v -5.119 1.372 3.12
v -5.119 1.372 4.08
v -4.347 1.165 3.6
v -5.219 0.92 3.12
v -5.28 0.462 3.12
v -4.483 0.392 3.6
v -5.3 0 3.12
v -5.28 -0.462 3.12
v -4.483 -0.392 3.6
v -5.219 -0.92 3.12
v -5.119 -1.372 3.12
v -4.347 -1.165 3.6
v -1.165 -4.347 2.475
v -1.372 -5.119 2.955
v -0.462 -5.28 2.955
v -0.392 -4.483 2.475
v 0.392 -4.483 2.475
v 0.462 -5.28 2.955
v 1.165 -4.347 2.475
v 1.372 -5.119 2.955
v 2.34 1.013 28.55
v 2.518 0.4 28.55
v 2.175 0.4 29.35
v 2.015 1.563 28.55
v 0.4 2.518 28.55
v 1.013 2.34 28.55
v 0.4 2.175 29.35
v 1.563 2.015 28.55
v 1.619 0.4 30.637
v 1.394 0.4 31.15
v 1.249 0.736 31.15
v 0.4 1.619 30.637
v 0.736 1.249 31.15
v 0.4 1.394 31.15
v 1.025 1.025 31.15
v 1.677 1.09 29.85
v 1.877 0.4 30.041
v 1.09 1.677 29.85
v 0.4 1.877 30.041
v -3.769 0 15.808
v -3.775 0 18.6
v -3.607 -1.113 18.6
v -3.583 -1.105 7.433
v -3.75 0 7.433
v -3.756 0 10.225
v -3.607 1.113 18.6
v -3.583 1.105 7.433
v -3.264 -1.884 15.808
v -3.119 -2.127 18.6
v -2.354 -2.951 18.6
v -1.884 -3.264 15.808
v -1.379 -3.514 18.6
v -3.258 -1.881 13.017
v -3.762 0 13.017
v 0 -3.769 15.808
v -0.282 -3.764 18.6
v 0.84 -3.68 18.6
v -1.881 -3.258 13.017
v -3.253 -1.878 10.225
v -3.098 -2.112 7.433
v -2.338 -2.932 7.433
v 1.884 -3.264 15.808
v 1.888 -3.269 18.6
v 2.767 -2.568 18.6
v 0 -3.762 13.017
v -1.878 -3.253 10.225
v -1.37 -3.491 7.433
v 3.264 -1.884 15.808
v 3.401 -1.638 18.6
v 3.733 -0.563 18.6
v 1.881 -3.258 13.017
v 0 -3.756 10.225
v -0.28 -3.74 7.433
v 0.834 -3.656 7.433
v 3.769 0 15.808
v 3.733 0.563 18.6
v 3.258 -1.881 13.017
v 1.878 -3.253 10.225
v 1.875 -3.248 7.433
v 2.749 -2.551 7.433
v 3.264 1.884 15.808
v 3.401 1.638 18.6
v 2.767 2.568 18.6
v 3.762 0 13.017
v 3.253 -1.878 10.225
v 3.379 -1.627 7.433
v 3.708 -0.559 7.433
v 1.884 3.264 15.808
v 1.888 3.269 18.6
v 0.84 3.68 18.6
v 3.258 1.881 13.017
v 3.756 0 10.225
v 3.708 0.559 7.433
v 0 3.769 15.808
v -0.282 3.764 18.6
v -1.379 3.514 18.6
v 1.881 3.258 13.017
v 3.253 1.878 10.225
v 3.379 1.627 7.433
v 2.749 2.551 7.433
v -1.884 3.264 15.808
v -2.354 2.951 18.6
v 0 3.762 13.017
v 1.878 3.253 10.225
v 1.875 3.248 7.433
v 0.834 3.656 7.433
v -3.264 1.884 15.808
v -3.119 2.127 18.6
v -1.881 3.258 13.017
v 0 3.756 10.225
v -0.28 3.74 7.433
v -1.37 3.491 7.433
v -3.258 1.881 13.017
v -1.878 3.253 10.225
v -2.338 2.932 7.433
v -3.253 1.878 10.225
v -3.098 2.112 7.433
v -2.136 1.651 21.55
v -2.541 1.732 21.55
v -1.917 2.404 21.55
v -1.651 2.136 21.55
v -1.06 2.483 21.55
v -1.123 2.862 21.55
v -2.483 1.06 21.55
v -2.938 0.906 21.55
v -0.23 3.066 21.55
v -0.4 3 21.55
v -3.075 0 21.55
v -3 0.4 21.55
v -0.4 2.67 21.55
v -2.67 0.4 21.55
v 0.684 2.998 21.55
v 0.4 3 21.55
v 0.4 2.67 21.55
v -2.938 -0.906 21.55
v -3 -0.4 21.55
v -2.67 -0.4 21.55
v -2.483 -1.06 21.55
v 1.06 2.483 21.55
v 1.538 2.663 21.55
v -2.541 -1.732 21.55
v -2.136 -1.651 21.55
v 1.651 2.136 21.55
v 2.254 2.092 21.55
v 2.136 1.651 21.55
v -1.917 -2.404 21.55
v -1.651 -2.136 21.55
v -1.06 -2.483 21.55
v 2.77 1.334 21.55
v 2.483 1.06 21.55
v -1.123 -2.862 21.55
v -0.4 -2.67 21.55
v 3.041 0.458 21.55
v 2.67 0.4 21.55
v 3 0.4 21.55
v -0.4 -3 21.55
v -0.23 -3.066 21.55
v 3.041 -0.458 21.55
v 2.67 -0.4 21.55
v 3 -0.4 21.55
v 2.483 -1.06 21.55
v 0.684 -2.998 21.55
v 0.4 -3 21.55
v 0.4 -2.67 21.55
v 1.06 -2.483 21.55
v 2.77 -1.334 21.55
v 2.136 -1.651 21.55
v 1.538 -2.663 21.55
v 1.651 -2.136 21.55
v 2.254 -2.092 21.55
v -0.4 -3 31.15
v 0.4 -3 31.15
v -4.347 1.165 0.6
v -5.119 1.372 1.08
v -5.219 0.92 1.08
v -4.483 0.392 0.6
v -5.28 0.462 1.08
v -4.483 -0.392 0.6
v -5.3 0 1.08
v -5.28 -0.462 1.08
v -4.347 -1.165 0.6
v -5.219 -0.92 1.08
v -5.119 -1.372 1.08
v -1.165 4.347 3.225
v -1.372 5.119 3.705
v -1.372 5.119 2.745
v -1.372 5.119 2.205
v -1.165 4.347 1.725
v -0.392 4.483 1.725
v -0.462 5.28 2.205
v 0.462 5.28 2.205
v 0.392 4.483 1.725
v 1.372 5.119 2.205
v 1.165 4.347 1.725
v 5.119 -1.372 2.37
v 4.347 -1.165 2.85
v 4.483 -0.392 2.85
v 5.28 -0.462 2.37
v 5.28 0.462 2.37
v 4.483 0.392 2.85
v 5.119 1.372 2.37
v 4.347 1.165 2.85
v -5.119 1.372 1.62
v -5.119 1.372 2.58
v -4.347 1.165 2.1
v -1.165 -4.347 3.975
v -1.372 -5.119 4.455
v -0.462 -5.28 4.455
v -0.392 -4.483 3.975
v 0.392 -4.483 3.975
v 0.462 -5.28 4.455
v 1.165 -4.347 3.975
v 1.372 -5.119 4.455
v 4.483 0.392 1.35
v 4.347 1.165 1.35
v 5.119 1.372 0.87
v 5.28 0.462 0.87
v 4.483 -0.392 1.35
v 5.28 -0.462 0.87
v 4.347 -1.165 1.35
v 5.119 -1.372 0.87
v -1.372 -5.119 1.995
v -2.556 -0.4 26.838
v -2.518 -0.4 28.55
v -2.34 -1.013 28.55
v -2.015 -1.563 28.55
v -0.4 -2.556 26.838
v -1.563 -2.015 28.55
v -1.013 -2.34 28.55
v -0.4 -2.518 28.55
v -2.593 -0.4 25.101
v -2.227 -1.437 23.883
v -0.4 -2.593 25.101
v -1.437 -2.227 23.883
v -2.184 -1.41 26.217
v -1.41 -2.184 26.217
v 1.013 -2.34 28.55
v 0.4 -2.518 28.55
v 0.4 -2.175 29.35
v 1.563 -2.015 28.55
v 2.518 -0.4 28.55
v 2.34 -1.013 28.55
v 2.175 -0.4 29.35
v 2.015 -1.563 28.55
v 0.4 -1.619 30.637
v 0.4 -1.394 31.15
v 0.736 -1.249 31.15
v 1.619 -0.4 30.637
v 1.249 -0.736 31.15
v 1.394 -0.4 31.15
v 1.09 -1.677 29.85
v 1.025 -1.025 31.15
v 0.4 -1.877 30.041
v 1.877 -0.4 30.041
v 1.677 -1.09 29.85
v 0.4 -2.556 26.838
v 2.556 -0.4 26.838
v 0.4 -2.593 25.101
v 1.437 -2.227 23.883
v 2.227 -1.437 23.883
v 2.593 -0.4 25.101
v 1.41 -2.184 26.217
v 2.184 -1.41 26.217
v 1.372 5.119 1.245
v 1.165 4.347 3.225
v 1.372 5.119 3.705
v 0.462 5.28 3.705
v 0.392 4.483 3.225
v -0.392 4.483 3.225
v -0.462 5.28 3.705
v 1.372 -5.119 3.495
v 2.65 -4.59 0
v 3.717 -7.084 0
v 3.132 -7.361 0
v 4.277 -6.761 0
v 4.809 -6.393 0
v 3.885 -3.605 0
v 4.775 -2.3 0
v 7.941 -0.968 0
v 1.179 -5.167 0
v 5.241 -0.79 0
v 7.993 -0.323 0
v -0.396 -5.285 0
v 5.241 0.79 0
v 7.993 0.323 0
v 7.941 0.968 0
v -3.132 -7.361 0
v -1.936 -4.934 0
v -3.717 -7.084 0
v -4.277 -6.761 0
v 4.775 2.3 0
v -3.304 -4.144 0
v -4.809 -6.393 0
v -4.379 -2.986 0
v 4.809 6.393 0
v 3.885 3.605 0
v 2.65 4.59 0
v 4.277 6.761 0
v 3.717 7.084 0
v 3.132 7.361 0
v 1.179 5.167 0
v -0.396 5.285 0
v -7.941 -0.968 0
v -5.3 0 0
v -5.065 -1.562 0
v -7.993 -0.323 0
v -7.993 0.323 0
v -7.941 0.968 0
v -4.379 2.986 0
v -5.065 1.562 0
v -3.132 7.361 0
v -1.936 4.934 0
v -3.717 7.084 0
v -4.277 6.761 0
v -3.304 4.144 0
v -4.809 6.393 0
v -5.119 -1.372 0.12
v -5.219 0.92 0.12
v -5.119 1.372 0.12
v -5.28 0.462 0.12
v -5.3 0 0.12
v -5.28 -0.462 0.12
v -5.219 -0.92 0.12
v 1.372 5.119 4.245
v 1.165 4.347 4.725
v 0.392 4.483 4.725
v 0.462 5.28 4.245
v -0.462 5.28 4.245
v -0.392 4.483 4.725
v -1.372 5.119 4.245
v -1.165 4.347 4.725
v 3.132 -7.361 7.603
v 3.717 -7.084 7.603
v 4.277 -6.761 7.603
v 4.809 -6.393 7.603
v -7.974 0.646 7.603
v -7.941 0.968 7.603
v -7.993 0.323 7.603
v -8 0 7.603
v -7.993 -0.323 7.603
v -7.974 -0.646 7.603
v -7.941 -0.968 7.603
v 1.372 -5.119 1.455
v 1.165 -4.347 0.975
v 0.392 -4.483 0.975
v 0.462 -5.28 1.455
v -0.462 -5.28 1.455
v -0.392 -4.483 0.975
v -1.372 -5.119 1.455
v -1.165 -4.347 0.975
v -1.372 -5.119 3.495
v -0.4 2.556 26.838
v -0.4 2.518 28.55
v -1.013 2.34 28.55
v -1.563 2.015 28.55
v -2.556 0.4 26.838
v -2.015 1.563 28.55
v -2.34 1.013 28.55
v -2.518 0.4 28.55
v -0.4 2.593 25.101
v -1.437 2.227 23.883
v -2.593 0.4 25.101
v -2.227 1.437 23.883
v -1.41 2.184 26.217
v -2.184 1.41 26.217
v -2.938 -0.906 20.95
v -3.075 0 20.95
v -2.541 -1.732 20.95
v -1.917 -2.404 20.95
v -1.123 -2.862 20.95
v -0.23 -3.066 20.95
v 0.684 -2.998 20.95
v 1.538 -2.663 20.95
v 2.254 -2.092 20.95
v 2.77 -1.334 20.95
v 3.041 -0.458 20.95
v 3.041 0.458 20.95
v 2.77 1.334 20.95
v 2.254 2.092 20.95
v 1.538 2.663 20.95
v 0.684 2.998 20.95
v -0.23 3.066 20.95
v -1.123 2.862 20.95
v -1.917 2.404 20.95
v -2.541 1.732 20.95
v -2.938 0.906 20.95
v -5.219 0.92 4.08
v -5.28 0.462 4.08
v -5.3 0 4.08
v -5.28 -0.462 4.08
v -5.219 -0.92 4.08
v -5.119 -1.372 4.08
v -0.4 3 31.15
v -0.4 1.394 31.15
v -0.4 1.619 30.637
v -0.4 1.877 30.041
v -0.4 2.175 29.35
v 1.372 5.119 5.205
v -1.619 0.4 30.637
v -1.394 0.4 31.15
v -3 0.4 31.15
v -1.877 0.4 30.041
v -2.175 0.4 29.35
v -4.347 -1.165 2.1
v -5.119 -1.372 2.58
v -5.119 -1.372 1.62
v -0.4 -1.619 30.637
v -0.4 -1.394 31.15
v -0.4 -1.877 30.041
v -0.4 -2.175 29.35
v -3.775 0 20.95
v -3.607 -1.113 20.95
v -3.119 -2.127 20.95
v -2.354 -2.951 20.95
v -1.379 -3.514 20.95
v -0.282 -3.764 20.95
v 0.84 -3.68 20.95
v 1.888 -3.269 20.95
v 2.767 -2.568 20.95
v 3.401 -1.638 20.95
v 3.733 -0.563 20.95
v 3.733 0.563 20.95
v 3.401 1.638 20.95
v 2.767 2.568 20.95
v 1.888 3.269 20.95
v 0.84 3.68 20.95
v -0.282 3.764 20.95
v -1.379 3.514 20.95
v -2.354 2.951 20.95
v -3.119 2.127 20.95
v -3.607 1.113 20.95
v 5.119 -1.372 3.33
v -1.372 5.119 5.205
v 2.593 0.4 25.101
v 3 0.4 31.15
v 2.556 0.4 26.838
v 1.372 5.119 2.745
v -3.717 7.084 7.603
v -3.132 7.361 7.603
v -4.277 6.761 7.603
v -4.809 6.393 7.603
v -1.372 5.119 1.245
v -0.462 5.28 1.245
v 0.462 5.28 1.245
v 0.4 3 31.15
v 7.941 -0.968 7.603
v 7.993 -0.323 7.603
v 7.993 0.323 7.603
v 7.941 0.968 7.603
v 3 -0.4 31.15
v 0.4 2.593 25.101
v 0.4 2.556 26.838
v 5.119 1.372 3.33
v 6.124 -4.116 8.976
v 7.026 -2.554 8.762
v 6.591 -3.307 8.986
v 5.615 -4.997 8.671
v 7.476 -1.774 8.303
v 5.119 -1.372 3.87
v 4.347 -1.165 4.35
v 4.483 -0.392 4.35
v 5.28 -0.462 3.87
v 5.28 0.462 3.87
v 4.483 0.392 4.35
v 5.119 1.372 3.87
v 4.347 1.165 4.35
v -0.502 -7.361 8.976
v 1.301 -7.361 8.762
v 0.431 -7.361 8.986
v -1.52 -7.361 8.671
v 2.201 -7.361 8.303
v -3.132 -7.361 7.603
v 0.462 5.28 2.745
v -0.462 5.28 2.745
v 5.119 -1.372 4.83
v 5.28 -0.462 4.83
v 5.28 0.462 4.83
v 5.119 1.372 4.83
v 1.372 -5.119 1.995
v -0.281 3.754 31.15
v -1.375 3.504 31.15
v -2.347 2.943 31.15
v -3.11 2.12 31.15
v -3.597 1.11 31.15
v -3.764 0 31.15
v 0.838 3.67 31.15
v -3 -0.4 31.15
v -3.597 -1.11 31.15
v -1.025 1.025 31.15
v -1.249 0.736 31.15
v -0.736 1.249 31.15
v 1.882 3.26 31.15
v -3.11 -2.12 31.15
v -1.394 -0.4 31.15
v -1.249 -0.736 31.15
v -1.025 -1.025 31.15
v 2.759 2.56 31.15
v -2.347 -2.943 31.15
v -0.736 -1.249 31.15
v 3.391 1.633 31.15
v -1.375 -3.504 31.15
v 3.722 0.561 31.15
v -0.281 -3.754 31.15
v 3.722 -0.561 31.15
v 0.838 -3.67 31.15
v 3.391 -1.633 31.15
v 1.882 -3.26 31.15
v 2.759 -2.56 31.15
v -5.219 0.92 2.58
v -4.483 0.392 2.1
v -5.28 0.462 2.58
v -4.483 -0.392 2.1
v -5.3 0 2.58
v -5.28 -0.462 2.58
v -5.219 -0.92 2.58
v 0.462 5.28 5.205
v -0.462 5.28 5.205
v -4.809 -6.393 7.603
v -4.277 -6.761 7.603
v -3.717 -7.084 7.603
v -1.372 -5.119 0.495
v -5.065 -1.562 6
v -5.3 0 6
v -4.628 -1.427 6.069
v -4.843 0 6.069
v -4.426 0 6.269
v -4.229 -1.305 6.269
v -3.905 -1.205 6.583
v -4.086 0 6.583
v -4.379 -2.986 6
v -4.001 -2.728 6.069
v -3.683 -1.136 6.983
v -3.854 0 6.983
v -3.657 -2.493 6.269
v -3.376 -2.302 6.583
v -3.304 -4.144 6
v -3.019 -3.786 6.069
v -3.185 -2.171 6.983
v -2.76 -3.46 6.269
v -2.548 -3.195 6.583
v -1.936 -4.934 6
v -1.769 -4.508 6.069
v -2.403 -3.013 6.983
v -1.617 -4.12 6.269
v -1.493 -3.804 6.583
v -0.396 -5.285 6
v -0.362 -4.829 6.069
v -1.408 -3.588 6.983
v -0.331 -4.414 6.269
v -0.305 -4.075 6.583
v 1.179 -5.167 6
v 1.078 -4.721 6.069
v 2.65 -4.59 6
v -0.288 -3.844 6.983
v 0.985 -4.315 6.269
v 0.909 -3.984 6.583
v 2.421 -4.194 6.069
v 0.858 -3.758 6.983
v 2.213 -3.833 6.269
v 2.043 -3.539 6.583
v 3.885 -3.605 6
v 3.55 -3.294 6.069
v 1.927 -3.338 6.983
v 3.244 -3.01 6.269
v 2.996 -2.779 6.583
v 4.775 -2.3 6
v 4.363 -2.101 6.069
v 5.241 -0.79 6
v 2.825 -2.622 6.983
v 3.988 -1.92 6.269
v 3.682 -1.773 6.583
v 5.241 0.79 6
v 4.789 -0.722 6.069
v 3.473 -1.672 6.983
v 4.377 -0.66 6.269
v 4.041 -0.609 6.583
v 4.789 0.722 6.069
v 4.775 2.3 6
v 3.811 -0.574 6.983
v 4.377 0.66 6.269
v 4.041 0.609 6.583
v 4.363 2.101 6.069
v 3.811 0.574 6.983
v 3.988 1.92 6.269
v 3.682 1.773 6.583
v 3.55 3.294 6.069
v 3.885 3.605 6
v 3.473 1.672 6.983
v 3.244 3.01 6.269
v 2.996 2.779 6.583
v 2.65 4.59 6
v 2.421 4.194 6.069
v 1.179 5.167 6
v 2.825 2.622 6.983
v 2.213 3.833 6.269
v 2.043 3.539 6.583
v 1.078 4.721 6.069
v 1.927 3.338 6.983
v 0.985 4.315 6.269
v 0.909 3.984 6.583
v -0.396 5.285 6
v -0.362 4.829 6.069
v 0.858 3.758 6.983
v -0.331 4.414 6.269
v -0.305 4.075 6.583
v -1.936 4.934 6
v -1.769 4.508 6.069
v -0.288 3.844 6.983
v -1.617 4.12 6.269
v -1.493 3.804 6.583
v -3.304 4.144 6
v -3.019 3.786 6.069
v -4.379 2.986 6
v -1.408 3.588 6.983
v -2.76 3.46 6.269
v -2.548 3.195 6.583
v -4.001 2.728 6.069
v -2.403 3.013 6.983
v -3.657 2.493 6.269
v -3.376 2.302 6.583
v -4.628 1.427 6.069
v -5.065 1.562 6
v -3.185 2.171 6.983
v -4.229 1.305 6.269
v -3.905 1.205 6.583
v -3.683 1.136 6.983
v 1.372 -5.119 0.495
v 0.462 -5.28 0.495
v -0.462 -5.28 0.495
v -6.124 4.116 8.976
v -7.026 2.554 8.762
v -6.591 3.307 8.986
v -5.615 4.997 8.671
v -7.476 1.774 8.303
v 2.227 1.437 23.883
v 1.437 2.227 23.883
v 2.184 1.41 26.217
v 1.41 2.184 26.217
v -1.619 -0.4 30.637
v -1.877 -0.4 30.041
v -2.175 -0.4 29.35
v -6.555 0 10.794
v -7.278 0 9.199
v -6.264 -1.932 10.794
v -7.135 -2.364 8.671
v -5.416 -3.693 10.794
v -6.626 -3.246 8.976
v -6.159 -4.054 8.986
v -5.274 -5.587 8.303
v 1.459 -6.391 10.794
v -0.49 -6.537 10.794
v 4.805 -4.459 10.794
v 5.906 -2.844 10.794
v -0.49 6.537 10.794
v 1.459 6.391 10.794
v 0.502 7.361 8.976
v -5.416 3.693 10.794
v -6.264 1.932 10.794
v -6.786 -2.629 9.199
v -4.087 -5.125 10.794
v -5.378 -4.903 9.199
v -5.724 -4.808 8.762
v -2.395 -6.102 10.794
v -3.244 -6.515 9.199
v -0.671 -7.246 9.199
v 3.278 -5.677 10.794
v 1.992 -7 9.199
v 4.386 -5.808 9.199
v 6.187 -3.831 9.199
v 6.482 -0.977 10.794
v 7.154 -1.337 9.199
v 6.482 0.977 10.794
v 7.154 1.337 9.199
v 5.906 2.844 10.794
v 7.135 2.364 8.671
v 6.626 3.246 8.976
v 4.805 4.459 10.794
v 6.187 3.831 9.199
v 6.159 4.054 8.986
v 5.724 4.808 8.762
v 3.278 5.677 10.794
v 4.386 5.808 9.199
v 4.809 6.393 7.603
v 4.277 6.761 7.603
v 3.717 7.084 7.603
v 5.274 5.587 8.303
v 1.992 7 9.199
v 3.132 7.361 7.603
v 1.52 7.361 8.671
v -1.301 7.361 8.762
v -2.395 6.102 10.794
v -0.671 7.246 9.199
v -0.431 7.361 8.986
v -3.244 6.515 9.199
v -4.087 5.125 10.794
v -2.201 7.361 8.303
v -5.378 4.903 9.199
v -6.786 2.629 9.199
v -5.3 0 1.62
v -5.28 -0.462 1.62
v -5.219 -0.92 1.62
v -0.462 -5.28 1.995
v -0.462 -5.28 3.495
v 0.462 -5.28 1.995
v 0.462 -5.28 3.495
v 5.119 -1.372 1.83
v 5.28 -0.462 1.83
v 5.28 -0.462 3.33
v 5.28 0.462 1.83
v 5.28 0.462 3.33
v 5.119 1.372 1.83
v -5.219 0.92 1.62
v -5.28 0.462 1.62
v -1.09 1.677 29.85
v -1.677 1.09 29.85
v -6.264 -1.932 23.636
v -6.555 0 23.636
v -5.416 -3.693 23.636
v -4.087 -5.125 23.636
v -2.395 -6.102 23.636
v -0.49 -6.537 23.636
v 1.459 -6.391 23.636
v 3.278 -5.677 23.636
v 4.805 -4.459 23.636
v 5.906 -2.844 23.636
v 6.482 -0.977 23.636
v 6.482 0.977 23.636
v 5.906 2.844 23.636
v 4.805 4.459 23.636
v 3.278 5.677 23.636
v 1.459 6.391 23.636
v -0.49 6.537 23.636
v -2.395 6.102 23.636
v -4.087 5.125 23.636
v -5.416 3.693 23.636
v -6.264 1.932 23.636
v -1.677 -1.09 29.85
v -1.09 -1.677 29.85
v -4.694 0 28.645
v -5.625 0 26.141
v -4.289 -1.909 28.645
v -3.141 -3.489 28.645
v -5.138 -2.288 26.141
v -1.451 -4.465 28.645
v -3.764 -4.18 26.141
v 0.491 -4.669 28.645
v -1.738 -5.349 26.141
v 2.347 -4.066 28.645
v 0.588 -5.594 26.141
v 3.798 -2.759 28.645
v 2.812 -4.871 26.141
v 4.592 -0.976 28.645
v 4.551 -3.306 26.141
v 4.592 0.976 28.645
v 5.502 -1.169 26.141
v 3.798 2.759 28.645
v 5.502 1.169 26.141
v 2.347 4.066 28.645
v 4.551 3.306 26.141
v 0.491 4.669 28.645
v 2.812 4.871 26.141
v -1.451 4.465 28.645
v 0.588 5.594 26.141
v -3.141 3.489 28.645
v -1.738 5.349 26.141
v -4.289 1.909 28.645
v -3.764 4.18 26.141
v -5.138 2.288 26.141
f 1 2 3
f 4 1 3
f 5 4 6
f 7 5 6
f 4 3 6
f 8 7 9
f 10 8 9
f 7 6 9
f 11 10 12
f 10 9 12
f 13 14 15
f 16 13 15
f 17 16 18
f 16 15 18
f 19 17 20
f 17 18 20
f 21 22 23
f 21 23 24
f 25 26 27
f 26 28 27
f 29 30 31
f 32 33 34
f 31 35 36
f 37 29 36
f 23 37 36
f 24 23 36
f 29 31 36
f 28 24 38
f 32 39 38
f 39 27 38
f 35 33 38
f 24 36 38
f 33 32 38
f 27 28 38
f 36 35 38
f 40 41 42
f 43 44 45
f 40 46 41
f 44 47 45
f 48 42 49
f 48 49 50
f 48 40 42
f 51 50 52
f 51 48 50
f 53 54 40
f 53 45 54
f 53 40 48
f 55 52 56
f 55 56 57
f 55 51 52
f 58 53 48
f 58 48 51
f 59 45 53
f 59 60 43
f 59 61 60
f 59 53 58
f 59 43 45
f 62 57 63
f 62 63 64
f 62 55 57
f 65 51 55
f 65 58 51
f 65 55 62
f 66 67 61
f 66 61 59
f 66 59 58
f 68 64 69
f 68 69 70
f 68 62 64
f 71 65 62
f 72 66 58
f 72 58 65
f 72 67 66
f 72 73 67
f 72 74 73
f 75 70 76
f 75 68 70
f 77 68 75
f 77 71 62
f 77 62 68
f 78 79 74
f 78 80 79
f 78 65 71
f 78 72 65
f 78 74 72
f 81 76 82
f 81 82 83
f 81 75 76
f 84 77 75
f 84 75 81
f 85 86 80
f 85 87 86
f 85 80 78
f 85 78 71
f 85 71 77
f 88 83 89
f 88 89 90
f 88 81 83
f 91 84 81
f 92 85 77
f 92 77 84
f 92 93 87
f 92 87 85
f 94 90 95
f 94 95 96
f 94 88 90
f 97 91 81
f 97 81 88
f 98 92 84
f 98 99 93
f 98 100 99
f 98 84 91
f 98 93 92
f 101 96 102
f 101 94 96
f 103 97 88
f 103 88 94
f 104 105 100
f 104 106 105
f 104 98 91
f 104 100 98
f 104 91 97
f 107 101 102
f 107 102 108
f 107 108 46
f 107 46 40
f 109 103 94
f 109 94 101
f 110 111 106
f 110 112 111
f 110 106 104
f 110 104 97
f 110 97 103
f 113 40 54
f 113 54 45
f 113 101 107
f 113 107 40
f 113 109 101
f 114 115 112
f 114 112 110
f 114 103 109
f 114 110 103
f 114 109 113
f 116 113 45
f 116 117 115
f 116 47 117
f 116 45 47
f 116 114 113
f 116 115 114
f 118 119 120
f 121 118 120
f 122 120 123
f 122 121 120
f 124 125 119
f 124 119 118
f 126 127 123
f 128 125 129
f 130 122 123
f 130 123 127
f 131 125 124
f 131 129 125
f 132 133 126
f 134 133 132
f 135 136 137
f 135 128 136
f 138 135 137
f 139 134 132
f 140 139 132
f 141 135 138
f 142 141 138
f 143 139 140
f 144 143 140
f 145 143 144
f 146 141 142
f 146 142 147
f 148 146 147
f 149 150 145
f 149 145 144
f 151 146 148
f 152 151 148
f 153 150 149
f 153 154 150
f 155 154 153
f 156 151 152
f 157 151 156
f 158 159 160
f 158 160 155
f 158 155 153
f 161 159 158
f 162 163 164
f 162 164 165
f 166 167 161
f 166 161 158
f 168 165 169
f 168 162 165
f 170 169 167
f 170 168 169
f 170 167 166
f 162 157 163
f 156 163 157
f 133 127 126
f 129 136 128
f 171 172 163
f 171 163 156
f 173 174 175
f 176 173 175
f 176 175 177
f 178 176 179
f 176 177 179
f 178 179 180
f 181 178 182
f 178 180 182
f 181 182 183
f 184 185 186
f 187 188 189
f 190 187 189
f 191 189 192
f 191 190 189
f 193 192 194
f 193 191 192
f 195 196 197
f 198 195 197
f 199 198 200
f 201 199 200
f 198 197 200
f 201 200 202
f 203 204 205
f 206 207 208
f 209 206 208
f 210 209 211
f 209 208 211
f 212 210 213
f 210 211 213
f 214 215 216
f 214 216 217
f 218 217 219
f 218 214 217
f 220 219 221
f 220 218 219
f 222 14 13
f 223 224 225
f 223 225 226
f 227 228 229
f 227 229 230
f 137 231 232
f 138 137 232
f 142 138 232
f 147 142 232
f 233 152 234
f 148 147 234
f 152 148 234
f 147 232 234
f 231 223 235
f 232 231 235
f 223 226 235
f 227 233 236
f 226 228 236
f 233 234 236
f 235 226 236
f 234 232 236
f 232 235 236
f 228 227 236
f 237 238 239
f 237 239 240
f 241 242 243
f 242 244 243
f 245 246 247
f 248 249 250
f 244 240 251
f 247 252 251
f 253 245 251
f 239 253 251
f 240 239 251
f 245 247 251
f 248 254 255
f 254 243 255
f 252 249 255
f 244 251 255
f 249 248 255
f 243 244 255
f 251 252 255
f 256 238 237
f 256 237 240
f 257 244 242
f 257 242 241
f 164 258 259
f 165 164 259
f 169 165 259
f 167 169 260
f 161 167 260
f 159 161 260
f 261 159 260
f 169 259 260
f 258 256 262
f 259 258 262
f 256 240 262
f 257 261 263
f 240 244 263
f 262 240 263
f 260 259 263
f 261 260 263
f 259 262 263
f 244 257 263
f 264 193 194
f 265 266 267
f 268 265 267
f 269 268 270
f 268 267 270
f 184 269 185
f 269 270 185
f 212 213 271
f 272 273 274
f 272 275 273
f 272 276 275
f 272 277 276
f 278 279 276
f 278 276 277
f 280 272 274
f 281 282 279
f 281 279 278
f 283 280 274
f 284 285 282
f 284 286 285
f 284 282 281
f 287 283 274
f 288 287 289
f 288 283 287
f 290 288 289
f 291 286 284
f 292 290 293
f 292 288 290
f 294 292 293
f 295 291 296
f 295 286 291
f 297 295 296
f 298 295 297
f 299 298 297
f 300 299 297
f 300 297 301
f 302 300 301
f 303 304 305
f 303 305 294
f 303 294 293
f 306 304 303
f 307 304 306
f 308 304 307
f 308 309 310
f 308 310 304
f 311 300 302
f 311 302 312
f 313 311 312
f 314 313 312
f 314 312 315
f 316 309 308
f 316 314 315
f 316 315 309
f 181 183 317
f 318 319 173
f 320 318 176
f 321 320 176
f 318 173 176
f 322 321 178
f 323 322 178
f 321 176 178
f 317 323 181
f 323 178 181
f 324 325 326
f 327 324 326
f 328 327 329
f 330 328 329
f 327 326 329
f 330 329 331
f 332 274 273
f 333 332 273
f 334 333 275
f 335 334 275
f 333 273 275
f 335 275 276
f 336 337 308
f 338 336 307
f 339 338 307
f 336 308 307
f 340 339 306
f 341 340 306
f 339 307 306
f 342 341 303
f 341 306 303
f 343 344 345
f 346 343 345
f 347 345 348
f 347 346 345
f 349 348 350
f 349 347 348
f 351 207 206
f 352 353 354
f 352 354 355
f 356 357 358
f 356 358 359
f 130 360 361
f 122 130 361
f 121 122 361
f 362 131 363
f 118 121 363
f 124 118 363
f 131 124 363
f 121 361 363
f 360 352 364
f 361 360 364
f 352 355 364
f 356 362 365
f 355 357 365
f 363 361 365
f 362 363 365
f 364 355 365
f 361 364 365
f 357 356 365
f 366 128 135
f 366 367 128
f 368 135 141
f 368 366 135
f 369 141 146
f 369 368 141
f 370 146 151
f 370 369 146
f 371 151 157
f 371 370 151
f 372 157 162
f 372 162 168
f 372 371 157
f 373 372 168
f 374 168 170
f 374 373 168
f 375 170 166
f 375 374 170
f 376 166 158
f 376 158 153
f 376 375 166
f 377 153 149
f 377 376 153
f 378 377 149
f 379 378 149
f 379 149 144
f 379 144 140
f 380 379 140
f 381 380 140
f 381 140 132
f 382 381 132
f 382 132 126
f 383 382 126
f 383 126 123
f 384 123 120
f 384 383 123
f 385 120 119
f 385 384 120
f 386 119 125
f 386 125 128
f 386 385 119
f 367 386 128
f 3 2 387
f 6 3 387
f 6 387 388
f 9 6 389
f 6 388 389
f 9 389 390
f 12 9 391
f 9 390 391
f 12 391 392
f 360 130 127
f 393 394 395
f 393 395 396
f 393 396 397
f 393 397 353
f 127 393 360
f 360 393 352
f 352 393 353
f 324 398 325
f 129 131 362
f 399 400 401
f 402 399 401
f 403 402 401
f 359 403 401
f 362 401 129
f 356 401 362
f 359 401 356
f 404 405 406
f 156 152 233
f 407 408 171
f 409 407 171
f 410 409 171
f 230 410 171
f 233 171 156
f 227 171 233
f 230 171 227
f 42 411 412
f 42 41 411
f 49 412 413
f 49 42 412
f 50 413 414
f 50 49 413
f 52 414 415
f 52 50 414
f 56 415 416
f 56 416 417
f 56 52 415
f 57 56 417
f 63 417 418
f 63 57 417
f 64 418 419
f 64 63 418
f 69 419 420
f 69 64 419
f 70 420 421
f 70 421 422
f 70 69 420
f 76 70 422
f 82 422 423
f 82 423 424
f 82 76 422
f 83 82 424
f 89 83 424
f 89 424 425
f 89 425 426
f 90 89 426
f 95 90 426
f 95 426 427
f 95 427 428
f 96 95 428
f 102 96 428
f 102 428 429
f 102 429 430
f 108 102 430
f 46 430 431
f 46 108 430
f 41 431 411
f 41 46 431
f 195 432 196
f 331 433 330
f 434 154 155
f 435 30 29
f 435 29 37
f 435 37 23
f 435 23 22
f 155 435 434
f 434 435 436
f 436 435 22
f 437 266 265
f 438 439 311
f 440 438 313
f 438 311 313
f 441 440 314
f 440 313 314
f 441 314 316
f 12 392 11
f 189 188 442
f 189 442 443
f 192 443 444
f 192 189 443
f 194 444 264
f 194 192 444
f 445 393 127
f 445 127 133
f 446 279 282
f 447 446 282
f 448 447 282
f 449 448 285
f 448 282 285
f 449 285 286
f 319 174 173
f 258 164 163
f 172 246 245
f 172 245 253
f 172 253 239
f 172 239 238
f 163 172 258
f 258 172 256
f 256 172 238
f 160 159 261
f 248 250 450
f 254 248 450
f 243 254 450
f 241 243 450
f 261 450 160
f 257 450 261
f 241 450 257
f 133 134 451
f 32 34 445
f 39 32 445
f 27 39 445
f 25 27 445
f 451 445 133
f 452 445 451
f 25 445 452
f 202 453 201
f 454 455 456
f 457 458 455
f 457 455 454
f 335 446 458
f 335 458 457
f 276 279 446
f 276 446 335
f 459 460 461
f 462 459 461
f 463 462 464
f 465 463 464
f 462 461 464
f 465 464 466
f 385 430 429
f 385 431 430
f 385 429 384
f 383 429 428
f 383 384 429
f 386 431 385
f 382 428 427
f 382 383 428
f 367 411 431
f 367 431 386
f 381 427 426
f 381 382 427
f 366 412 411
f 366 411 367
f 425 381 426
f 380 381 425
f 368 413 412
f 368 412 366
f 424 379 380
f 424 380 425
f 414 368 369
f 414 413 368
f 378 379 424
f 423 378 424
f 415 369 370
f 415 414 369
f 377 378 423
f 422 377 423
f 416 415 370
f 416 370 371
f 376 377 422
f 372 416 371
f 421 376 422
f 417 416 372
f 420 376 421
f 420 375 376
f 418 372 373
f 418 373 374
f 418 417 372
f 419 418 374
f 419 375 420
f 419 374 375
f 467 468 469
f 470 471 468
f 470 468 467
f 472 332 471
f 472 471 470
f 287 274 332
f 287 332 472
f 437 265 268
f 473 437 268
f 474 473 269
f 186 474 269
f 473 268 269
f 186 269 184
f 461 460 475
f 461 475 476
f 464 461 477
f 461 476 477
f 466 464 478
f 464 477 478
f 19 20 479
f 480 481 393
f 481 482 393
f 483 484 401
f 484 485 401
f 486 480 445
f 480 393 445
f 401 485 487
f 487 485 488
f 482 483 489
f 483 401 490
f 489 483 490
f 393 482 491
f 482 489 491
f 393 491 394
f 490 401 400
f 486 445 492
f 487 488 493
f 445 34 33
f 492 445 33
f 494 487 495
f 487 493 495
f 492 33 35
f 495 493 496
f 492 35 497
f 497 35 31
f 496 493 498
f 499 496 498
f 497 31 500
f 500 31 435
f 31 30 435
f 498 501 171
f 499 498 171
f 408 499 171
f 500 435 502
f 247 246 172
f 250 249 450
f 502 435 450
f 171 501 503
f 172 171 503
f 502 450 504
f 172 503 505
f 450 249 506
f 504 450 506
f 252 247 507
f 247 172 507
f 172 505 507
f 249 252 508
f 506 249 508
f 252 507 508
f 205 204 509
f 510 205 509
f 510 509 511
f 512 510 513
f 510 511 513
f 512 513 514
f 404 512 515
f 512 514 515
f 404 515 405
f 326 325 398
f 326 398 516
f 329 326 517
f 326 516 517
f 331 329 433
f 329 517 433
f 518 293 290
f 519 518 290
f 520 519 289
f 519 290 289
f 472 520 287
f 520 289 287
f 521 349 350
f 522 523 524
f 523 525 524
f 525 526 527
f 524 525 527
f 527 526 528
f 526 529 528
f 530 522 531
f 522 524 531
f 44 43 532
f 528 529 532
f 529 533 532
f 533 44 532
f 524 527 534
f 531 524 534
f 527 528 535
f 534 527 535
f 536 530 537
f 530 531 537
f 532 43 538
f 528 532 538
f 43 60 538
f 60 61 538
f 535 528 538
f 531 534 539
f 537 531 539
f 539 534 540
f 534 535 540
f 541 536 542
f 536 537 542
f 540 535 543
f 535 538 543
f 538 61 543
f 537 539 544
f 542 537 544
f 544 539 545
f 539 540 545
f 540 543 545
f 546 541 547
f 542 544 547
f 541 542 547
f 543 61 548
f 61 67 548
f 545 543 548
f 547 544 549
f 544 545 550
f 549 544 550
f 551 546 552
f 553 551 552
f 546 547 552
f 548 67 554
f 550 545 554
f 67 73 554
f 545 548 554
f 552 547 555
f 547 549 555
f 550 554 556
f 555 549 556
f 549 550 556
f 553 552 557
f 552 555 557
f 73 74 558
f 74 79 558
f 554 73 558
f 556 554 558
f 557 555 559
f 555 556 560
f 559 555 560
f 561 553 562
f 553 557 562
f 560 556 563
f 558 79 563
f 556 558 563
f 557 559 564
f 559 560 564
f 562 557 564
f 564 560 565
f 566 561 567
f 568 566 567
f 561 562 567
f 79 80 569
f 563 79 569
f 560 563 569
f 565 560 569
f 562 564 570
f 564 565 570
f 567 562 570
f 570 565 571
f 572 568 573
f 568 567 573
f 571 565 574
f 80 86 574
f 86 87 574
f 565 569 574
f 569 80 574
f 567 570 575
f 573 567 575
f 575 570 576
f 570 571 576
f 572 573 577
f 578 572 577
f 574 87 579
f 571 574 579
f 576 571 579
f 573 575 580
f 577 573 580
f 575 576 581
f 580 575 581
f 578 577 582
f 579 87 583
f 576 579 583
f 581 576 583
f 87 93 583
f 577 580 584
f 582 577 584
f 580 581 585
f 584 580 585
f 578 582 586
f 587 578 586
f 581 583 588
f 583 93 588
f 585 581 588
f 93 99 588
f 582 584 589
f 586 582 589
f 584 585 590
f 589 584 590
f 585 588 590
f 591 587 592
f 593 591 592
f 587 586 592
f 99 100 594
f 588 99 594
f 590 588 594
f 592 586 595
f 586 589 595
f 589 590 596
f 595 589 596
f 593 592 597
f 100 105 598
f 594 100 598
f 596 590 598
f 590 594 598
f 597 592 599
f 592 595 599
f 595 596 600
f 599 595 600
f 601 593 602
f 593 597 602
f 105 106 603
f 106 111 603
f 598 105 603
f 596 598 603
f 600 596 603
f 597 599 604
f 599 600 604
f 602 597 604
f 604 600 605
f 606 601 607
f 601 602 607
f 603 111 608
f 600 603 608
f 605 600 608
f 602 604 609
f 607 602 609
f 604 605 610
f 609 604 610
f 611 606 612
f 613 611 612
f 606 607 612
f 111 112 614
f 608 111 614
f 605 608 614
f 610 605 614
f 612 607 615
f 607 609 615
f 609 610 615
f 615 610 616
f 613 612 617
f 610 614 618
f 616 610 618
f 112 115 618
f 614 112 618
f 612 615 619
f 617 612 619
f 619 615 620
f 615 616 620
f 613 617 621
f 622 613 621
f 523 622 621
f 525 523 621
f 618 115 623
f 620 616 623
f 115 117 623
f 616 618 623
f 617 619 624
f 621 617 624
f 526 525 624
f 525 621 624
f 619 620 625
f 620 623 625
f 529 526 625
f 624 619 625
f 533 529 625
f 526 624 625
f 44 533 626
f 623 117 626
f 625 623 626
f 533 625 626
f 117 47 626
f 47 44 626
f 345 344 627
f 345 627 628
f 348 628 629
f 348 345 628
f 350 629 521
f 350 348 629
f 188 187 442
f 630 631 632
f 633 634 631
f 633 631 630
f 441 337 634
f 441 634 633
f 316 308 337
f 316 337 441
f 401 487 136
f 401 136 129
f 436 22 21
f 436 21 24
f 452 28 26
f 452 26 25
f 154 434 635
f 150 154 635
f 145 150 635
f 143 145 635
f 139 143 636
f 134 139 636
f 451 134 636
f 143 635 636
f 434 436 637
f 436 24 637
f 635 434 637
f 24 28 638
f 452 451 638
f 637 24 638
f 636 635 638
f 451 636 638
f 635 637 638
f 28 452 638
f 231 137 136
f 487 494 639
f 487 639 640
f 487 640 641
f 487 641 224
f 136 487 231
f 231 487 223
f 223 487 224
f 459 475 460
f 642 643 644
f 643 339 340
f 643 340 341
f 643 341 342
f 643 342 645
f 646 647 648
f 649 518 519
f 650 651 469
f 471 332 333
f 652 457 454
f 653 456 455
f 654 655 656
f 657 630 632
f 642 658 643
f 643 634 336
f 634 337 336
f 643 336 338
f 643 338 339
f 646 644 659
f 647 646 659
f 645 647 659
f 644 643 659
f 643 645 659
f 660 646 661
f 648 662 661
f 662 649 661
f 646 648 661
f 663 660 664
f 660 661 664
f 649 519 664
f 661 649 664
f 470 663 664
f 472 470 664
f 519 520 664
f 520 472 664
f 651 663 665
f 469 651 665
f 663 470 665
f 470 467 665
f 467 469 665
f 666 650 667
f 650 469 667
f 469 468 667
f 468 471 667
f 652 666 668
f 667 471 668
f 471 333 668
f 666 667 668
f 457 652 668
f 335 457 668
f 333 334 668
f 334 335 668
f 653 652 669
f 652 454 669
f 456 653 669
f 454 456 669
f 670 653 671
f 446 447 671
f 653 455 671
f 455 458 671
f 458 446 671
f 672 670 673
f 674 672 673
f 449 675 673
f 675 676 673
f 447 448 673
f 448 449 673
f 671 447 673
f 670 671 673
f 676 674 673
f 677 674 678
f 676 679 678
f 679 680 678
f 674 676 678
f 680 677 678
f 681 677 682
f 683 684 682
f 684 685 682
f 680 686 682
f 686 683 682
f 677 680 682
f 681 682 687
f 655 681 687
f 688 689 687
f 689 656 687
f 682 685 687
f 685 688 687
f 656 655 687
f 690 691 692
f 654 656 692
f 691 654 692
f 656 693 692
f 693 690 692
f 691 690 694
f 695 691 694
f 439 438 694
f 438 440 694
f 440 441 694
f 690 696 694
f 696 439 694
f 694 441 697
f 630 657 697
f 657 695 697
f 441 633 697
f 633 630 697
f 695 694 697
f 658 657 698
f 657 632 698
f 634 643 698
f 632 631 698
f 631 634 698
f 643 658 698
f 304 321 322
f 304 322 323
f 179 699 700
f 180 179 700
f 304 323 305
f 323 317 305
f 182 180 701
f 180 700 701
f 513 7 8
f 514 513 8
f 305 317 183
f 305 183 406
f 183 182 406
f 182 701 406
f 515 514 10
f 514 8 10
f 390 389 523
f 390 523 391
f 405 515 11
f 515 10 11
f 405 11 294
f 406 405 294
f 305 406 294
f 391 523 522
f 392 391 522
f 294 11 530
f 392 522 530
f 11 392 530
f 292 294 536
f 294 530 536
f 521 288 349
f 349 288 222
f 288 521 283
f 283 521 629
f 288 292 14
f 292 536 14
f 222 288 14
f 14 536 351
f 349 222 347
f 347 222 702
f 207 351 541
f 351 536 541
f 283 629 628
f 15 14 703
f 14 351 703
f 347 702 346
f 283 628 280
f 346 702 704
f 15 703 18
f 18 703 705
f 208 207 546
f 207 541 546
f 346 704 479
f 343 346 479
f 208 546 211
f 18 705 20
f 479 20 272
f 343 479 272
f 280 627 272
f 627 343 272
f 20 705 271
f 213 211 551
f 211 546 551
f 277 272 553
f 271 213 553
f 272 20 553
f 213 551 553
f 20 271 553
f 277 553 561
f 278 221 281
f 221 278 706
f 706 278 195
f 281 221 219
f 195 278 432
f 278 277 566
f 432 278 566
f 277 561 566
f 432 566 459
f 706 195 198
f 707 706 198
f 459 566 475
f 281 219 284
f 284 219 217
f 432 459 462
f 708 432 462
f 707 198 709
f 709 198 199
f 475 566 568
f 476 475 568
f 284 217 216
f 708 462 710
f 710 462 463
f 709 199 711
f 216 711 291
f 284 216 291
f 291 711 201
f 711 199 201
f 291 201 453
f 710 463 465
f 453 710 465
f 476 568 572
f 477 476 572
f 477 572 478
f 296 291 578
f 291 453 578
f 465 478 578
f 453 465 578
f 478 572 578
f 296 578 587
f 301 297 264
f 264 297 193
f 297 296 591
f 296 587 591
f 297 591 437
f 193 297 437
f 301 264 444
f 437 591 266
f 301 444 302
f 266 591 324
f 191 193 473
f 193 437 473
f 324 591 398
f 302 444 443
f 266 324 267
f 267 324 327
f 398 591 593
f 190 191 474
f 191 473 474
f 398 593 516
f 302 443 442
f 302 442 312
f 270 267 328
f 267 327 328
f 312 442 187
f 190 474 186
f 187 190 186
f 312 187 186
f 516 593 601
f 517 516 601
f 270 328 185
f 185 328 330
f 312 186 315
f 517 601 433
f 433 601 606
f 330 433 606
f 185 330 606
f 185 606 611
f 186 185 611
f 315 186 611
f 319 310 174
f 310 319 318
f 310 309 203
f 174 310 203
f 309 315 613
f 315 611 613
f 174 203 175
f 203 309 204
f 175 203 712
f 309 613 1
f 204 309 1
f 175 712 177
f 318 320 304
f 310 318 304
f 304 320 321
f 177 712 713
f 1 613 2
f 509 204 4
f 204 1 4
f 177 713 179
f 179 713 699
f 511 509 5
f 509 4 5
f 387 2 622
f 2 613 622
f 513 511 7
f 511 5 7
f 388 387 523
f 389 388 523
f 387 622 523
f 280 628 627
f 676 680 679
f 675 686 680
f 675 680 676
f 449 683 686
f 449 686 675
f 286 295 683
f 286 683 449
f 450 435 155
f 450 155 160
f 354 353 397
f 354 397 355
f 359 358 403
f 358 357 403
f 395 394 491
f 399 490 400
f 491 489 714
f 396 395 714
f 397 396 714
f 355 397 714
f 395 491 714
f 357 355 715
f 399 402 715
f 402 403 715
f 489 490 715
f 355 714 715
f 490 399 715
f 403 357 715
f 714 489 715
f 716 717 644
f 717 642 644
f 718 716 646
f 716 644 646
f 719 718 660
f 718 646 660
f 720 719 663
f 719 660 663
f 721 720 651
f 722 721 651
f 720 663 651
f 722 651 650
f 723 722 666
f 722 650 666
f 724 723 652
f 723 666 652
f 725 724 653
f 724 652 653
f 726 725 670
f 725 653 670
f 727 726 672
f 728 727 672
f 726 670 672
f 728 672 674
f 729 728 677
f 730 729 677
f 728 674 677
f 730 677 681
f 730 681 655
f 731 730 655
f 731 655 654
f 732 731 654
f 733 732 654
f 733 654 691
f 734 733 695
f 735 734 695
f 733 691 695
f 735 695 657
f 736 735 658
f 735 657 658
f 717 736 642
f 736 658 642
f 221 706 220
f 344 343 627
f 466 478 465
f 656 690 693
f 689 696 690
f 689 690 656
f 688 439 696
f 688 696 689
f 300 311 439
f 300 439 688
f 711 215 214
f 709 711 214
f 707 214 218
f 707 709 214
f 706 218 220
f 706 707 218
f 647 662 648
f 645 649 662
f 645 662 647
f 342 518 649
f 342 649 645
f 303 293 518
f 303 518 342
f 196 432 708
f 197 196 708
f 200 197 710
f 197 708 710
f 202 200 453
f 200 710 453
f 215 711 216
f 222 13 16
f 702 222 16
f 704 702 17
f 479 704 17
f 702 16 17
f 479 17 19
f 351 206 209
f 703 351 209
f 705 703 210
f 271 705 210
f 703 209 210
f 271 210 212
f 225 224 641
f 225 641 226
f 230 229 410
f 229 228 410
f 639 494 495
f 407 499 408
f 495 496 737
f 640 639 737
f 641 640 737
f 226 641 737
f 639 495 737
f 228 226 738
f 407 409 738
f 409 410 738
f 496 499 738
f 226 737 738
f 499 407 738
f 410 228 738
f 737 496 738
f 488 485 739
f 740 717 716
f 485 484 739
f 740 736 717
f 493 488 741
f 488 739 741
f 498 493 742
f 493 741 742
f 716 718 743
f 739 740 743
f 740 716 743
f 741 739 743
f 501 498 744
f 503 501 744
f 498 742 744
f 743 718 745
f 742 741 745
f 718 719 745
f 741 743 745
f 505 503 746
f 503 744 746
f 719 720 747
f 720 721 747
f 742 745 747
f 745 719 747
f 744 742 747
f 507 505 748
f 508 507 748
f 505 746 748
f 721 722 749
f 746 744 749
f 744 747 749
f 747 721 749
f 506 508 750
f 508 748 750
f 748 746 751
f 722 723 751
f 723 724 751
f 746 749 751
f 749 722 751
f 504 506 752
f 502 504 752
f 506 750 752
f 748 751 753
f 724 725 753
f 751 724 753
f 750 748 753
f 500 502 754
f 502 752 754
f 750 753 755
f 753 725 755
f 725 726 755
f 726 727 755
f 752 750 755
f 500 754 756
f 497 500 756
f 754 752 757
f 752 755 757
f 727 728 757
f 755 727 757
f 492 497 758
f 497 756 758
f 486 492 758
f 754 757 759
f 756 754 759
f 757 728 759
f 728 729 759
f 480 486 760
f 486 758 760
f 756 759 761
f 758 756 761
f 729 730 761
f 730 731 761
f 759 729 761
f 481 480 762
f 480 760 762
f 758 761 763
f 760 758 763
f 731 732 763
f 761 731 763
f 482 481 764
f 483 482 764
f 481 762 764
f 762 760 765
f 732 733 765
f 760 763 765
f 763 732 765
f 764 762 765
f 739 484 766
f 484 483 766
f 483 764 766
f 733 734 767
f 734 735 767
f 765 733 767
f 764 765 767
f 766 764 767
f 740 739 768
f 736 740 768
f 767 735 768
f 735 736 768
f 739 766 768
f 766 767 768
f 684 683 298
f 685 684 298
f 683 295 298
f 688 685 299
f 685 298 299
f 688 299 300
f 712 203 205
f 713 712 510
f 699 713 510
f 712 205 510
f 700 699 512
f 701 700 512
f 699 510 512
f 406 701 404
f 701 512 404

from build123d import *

# Parameters (mm, degrees)
SKETCH001_R         = 14.291544
POCKET_DEPTH        = 31.151
REVOLUTION001_ANGLE = 30
REVOLUTION002_ANGLE = 30
REVOLUTION003_ANGLE = 30
REVOLUTION004_ANGLE = 30
SKETCH006_W         = 0.8
SKETCH006_H         = 2.14163
POCKET001_DEPTH     = 107.126588
POLARPATTERN_COUNT  = 4


with BuildPart() as part:
    # Sketch → Revolution (revolve)
    with BuildSketch(Plane.XZ):
        with BuildLine():
            Line((-5.3, 0), (-5.3, 6))
            ThreePointArc((-5.3, 6), (-4.244457, 6.413224), (-3.75, 7.433241))
            Line((-3.775, 18.6), (-3.75, 7.433241))
            Line((-3.775, 20.95), (-3.775, 18.6))
            Line((-3.075, 20.95), (-3.775, 20.95))
            Line((-3.075, 21.55), (-3.075, 20.95))
            Line((-2.7, 21.55), (-3.075, 21.55))
            Line((-2.7, 21.55), (-2.55, 28.55))
            Line((-2.55, 28.55), (-1.45, 31.15))
            Line((-1.45, 31.15), (-3.764164, 31.15))
            Line((-3.764164, 31.15), (-6.55502, 23.635956))
            Line((-6.55502, 23.635956), (-6.55502, 10.794422))
            Line((-6.55502, 10.794422), (-8, 7.60349))
            Line((-8, 7.60349), (-8, 0))
            Line((-5.3, 0), (-8, 0))
        make_face()
    revolve(axis=Axis((0, 0, 0), (0, 0, 1)))

    # Sketch001 (on Face8 of Revolution) → Pocket (cut, through all)
    with BuildSketch(Plane(origin=(0, 0, 0), x_dir=(1, 0, 0), z_dir=(0, 0, -1))):
        Circle(SKETCH001_R)
        Polygon((8.5, 0), (4.25, 7.361216), (-4.25, 7.361216), (-8.5, 0), (-4.25, -7.361216), (4.25, -7.361216), align=None, mode=Mode.SUBTRACT)
    extrude(amount=-POCKET_DEPTH, mode=Mode.SUBTRACT)

    # Sketch002 → Revolution001 (revolve, symmetric)
    with BuildSketch(Plane.XZ) as revolution001_sk:
        Polygon((-5.5, 0), (-4.5, 0.6), (-5.5, 1.2), (-6.5, 1.2), (-6.5, 0), align=None)
        Polygon((-5.5, 1.5), (-4.5, 2.1), (-5.5, 2.7), (-6.5, 2.7), (-6.5, 1.5), align=None)
        Polygon((-5.5, 3), (-4.5, 3.6), (-5.5, 4.2), (-6.5, 4.2), (-6.5, 3), align=None)
    revolve(axis=Axis((0, 0, 0), (0, 0, 1)), revolution_arc=REVOLUTION001_ANGLE / 2)
    revolve(revolution001_sk.sketch, axis=Axis((0, 0, 0), (0, 0, -1)), revolution_arc=REVOLUTION001_ANGLE / 2)

    # Sketch003 → Revolution002 (revolve, symmetric)
    with BuildSketch(Plane(origin=(0, 0, 0.375), x_dir=(0, 1, 0), z_dir=(1, 0, 0))) as revolution002_sk:
        Polygon((-5.5, 0), (-4.5, 0.6), (-5.5, 1.2), (-6.5, 1.2), (-6.5, 0), align=None)
        Polygon((-5.5, 1.5), (-4.5, 2.1), (-5.5, 2.7), (-6.5, 2.7), (-6.5, 1.5), align=None)
        Polygon((-5.5, 3), (-4.5, 3.6), (-5.5, 4.2), (-6.5, 4.2), (-6.5, 3), align=None)
    revolve(axis=Axis((0, 0, 0.375), (0, 0, 1)), revolution_arc=REVOLUTION002_ANGLE / 2)
    revolve(revolution002_sk.sketch, axis=Axis((0, 0, 0.375), (0, 0, -1)), revolution_arc=REVOLUTION002_ANGLE / 2)

    # Sketch004 → Revolution003 (revolve, symmetric)
    with BuildSketch(Plane(origin=(0, 0, 0.75), x_dir=(-1, 0, 0), z_dir=(0, 1, 0))) as revolution003_sk:
        Polygon((-5.5, 0), (-4.5, 0.6), (-5.5, 1.2), (-6.5, 1.2), (-6.5, 0), align=None)
        Polygon((-5.5, 1.5), (-4.5, 2.1), (-5.5, 2.7), (-6.5, 2.7), (-6.5, 1.5), align=None)
        Polygon((-5.5, 3), (-4.5, 3.6), (-5.5, 4.2), (-6.5, 4.2), (-6.5, 3), align=None)
    revolve(axis=Axis((0, 0, 0.75), (0, 0, 1)), revolution_arc=REVOLUTION003_ANGLE / 2)
    revolve(revolution003_sk.sketch, axis=Axis((0, 0, 0.75), (0, 0, -1)), revolution_arc=REVOLUTION003_ANGLE / 2)

    # Sketch005 → Revolution004 (revolve, symmetric)
    with BuildSketch(Plane(origin=(0, 0, 1.125), x_dir=(0, -1, 0), z_dir=(-1, 0, 0))) as revolution004_sk:
        Polygon((-5.5, 0), (-4.5, 0.6), (-5.5, 1.2), (-6.5, 1.2), (-6.5, 0), align=None)
        Polygon((-5.5, 1.5), (-4.5, 2.1), (-5.5, 2.7), (-6.5, 2.7), (-6.5, 1.5), align=None)
        Polygon((-5.5, 3), (-4.5, 3.6), (-5.5, 4.2), (-6.5, 4.2), (-6.5, 3), align=None)
    revolve(axis=Axis((0, 0, 1.125), (0, 0, 1)), revolution_arc=REVOLUTION004_ANGLE / 2)
    revolve(revolution004_sk.sketch, axis=Axis((0, 0, 1.125), (0, 0, -1)), revolution_arc=REVOLUTION004_ANGLE / 2)

    # Sketch006 (on Face5 of Revolution004) → Pocket001 (cut, through all)
    with BuildSketch(Plane(origin=(0, 0, 31.15), x_dir=(-1, 0, 0), z_dir=(0, 0, 1))):
        with Locations((0, 1.929185)):
            Rectangle(SKETCH006_W, SKETCH006_H)
    pocket001 = extrude(amount=-POCKET001_DEPTH, mode=Mode.SUBTRACT)

    # PolarPattern: Pocket001 ×4 about axis
    polarpattern_axis = Axis((0, 0, 31.15), (0, 0, 1))
    for i in range(1, POLARPATTERN_COUNT):
        add(pocket001.rotate(polarpattern_axis, i * 360 / POLARPATTERN_COUNT), mode=Mode.SUBTRACT)


solid = part.part
